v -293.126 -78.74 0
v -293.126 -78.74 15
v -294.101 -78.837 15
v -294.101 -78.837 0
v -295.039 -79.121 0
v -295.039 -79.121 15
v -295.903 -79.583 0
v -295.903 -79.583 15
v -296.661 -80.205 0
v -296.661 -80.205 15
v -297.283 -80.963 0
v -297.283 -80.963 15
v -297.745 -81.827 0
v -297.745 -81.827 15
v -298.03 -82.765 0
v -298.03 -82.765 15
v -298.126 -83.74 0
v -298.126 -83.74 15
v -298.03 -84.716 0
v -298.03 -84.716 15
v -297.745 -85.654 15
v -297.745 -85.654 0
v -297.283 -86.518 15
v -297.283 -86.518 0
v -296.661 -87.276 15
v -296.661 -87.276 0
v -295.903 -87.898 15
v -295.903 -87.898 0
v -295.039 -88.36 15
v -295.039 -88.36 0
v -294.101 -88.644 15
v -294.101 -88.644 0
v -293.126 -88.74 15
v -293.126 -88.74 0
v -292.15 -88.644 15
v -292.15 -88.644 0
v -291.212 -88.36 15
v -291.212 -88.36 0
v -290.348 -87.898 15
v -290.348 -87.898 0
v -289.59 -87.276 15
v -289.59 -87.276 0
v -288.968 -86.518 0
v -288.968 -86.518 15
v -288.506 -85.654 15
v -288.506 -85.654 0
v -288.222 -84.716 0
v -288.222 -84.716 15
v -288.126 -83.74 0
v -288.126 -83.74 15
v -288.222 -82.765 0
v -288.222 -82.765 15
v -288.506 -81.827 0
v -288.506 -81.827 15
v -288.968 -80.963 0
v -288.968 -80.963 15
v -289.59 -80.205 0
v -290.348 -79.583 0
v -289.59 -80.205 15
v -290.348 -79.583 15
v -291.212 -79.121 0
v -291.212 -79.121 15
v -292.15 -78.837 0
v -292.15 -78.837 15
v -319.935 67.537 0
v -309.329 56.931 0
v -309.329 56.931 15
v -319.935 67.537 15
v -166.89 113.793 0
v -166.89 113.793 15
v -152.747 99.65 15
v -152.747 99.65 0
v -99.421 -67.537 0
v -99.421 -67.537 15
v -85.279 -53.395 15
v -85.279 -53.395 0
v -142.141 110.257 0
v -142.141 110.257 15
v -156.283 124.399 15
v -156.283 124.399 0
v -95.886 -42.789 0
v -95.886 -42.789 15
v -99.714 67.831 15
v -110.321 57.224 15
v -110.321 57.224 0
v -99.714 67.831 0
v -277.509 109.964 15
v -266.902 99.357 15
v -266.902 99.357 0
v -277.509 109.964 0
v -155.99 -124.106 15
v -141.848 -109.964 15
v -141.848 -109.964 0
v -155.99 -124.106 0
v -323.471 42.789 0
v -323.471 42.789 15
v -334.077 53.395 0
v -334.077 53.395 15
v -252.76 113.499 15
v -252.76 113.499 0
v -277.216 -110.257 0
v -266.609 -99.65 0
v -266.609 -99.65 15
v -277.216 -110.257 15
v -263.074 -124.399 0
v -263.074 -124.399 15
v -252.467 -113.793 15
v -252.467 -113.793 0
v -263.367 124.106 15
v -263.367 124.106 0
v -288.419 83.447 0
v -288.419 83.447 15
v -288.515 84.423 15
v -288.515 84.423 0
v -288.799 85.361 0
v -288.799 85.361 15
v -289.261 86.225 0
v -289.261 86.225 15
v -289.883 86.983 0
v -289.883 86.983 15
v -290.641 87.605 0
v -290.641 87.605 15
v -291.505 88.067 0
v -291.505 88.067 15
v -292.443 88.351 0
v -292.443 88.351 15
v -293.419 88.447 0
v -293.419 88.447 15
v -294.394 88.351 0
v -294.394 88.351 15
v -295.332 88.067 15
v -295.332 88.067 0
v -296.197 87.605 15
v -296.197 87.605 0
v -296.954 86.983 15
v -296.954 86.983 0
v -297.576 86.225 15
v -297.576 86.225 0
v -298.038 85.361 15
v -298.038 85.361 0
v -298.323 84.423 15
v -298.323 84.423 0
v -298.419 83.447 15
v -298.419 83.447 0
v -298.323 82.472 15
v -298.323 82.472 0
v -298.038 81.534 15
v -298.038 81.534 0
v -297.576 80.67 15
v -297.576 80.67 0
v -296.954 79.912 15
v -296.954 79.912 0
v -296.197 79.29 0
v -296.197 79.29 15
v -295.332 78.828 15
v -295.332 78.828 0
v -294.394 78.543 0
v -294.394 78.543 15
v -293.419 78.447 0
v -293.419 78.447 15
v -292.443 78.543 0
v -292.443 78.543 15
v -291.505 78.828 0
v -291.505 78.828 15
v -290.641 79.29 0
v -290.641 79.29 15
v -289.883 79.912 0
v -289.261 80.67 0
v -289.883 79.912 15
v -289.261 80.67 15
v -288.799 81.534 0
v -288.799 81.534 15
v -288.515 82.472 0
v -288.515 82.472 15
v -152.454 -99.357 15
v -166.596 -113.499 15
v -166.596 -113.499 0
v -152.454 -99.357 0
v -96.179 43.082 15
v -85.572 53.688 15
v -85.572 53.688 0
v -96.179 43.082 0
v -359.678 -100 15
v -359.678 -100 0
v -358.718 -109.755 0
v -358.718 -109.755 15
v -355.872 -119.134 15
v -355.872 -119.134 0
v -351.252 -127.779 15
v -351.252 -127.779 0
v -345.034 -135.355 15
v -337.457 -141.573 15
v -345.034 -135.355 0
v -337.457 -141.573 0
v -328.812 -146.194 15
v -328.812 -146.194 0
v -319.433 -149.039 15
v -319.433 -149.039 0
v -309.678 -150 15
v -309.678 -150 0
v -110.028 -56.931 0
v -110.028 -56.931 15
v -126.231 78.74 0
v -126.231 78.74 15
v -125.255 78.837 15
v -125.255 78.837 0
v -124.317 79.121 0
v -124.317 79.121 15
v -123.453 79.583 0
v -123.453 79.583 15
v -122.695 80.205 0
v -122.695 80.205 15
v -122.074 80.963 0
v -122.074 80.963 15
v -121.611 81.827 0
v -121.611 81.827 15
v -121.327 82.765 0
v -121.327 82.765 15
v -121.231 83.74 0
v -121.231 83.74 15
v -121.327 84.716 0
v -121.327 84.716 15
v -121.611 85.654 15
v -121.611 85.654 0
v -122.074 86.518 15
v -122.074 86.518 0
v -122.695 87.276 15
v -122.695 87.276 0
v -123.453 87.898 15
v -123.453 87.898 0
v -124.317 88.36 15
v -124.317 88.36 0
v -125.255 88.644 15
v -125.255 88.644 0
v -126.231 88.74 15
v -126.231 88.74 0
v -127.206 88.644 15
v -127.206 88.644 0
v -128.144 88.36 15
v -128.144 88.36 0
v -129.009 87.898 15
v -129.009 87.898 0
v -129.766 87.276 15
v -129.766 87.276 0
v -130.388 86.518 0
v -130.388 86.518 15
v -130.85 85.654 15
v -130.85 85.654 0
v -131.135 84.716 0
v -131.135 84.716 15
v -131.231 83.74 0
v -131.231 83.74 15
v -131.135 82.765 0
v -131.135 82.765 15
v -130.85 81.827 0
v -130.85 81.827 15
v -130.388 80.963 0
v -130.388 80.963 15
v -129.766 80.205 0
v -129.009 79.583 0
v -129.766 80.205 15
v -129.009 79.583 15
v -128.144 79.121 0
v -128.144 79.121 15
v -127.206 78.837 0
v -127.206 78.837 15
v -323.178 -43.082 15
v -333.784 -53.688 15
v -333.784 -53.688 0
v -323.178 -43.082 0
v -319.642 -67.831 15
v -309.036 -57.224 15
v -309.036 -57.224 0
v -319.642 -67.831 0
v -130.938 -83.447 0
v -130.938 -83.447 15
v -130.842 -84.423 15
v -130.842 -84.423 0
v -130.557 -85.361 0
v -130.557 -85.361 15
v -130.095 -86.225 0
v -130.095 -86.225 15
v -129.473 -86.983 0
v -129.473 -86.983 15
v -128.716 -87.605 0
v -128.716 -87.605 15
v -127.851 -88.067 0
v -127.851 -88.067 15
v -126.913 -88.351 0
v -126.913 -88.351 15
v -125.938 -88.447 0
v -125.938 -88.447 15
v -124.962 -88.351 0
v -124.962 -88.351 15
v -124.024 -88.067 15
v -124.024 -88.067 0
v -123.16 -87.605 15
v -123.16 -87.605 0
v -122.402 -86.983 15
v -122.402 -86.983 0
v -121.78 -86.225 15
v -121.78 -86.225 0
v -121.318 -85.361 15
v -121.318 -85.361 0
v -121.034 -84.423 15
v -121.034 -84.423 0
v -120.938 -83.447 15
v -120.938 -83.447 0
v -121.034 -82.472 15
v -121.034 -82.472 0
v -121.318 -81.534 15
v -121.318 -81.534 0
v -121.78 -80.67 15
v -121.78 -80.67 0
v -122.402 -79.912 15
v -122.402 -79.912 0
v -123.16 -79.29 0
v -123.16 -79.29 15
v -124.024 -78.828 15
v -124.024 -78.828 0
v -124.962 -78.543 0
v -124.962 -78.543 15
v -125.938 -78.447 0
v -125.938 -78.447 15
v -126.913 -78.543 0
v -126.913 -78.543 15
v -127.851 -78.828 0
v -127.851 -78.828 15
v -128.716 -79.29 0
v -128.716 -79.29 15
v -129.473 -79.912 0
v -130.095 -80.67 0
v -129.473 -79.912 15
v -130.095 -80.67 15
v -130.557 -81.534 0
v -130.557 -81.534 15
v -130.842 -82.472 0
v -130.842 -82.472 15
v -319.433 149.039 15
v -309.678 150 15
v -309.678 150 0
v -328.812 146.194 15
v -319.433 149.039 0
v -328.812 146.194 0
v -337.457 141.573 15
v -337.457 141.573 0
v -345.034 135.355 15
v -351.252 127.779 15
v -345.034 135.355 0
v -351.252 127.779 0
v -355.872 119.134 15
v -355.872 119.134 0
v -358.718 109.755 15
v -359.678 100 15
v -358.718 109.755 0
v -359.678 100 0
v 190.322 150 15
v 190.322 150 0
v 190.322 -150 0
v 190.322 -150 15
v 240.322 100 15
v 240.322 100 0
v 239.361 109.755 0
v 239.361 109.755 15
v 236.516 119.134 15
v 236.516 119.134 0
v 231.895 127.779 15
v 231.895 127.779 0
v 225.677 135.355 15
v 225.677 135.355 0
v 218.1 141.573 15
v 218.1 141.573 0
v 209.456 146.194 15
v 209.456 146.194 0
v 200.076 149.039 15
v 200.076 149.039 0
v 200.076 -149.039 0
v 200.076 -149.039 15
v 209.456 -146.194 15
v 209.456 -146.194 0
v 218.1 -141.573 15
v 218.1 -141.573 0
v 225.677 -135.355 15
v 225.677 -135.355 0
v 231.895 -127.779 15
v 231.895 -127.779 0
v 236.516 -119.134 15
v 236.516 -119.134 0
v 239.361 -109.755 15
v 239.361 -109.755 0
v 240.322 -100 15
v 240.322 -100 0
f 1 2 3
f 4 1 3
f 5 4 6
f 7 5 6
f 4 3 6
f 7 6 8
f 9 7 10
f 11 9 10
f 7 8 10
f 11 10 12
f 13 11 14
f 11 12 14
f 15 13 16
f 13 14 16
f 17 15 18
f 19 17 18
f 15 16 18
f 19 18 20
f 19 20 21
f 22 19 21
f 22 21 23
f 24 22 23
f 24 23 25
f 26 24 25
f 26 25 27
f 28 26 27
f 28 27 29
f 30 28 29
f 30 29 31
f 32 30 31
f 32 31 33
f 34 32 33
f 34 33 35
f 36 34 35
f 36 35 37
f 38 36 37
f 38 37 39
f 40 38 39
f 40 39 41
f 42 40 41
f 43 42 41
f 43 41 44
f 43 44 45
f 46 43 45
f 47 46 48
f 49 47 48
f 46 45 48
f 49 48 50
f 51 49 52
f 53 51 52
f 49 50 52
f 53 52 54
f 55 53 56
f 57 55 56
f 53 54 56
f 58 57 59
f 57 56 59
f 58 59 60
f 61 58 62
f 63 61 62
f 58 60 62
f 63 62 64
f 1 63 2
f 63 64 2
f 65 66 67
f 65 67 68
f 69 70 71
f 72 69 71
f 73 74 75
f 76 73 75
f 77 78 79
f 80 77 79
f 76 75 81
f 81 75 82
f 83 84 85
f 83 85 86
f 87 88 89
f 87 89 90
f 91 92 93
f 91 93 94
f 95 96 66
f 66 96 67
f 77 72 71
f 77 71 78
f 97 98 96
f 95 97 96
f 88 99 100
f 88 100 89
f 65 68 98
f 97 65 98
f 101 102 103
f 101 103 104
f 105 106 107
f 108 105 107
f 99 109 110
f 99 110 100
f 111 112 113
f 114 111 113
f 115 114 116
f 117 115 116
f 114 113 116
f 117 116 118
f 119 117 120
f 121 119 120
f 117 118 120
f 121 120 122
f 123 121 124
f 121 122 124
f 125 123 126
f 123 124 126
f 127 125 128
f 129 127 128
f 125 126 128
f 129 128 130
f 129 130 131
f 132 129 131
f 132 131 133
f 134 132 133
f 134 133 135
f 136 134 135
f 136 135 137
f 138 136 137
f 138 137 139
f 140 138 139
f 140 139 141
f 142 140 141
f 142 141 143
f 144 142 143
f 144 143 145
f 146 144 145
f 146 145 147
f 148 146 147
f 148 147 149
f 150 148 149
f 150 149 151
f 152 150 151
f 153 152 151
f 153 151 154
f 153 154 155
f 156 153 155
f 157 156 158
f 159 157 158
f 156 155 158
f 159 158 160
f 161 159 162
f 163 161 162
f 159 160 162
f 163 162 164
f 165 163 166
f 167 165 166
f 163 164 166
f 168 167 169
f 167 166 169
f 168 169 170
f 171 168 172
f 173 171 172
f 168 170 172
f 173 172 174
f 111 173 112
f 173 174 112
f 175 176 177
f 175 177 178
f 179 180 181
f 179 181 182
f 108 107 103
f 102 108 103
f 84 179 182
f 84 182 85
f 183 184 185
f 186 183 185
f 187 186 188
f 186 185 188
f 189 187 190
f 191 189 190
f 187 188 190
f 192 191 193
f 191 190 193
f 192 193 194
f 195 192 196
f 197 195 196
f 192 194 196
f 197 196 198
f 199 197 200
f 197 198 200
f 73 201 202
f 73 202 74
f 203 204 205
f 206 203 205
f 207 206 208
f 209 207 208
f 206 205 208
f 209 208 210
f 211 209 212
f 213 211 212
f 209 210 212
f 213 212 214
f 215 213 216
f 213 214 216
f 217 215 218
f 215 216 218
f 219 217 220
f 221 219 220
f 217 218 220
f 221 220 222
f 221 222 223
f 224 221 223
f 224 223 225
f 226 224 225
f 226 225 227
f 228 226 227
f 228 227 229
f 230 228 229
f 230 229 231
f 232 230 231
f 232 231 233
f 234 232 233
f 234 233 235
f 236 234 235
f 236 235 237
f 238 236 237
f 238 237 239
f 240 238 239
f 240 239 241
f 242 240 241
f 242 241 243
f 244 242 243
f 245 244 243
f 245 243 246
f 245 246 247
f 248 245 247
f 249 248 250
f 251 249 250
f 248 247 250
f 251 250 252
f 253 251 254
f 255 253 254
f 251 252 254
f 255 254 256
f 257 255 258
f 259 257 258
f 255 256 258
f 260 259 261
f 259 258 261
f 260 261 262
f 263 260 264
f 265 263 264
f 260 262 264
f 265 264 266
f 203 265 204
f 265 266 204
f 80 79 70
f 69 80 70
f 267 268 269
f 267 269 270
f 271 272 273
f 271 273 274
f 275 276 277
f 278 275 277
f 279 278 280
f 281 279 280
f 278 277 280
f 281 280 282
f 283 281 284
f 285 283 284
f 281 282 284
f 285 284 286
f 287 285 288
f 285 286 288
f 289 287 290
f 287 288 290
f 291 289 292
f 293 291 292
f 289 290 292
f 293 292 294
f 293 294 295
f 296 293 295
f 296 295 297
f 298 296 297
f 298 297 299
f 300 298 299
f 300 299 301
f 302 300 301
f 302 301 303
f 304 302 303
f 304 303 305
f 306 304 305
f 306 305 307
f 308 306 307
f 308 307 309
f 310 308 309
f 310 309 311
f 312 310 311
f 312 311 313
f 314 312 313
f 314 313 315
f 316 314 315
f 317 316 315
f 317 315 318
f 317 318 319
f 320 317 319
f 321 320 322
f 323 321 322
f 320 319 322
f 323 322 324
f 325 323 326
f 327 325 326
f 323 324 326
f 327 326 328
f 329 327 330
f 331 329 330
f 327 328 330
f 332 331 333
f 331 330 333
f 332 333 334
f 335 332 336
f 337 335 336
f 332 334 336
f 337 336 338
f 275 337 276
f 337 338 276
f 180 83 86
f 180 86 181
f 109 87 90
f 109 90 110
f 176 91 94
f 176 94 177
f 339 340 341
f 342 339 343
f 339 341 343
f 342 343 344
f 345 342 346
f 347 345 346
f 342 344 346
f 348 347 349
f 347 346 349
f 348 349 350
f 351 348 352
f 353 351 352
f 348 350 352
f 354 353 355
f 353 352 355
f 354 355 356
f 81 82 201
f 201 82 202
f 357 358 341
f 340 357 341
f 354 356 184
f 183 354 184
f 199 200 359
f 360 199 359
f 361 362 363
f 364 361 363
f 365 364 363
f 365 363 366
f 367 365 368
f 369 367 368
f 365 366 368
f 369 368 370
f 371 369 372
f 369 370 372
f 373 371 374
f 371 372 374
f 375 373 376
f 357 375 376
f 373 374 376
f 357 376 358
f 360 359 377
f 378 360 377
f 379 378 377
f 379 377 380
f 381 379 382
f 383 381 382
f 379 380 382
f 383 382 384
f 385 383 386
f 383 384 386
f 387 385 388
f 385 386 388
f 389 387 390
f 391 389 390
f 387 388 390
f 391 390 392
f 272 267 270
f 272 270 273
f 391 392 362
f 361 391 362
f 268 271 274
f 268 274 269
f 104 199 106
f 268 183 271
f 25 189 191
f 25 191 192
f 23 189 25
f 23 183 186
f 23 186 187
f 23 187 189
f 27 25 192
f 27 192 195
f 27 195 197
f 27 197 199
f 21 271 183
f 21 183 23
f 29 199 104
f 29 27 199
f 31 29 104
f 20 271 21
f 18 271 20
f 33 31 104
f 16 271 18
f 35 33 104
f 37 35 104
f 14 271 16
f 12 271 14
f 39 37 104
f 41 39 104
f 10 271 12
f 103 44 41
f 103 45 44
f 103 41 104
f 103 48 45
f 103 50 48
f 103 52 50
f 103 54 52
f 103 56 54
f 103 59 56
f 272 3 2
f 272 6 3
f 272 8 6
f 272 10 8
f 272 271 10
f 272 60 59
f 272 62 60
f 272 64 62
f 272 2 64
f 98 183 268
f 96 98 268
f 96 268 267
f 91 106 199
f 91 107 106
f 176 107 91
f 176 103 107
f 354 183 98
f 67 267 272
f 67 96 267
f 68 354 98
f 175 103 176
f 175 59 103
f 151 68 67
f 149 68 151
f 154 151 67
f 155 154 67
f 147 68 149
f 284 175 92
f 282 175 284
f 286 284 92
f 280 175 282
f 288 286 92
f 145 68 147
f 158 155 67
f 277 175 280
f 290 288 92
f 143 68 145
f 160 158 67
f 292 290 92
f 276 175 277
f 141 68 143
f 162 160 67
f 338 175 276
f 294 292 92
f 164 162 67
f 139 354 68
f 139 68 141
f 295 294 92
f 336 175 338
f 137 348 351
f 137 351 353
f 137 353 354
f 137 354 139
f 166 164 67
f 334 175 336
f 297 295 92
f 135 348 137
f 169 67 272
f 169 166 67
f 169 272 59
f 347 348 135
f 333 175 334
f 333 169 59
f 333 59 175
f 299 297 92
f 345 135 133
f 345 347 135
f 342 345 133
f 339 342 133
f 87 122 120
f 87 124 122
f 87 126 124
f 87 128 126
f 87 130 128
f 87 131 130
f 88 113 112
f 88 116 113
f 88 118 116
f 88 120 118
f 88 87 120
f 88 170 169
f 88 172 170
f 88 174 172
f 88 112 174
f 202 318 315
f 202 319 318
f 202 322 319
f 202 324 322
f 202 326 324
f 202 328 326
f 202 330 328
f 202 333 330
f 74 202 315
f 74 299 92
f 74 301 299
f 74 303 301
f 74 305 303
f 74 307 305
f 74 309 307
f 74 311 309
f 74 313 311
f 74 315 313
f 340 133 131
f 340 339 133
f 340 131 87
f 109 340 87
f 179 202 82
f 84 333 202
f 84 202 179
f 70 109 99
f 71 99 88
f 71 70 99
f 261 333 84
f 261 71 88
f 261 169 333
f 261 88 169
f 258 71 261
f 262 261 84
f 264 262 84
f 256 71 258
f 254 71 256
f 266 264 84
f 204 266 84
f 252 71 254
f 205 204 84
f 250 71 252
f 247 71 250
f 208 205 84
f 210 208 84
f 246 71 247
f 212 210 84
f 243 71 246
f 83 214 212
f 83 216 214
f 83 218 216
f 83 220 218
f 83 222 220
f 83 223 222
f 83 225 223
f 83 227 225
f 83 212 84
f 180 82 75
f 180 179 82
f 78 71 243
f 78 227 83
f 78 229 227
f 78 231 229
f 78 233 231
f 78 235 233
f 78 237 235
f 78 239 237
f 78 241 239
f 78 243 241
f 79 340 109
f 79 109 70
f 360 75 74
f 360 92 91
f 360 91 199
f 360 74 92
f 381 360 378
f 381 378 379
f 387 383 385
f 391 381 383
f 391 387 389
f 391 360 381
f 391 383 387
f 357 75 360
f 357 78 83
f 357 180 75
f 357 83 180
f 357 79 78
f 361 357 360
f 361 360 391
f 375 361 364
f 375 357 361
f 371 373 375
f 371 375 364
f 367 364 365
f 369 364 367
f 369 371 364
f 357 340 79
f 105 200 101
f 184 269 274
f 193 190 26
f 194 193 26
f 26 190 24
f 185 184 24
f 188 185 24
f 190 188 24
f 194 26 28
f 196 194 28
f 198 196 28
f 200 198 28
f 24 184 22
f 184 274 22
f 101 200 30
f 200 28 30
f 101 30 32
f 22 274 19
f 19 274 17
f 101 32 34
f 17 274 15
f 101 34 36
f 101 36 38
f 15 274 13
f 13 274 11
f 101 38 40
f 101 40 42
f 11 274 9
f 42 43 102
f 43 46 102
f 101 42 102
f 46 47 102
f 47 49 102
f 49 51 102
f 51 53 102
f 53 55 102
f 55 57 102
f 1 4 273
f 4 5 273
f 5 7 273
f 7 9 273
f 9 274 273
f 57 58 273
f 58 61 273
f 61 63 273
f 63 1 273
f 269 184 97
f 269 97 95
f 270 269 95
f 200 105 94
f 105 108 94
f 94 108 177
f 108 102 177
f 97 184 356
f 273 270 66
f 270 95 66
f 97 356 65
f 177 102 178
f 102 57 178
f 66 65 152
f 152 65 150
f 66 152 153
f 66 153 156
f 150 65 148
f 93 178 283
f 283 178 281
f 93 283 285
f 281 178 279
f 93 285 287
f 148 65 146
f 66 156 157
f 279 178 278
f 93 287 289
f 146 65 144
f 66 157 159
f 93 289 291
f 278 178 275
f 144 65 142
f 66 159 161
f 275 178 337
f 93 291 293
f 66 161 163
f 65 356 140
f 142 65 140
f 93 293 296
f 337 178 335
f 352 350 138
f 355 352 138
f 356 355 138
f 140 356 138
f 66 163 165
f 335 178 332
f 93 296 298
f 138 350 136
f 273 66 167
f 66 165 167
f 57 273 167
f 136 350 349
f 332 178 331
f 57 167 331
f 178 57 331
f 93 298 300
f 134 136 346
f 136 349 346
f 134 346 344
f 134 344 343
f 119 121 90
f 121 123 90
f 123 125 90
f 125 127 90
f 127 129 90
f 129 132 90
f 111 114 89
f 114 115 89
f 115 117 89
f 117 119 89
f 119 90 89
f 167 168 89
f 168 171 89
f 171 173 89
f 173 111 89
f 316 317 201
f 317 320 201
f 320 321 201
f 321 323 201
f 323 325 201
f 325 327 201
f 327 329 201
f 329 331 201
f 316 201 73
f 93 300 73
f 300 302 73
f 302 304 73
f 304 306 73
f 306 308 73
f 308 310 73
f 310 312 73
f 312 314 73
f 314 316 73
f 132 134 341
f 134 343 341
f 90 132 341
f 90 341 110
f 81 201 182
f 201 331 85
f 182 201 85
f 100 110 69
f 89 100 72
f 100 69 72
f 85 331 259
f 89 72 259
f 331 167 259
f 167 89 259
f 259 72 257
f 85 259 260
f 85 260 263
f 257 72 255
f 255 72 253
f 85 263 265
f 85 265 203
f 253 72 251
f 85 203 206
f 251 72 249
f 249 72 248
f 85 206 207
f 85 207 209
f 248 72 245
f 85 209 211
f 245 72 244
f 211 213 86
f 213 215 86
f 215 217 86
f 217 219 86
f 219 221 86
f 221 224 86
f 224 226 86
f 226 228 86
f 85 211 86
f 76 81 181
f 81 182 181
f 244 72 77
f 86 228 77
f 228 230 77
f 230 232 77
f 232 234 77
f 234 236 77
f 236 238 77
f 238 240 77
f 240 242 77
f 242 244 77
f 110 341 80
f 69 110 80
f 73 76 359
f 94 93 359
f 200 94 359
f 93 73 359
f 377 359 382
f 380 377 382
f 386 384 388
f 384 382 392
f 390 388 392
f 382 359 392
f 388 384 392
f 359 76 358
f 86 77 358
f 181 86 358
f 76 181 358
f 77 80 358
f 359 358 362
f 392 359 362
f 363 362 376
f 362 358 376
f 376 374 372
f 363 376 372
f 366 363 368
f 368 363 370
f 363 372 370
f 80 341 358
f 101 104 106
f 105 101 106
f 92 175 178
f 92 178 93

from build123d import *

# Parameters (mm, degrees)
BOSS_EXTRU_1_DEPTH           = 15
ESQUISSE3_R                  = 5
ENL_V_MAT_EXTRU_1_DEPTH      = 390.991583511
R_P_TITION_CIRCULAIRE1_COUNT = 4


with BuildPart() as part:
    # Esquisse1 → Boss.-Extru.1 (new body)
    with BuildSketch(Plane.XY):
        with BuildLine():
            ThreePointArc((-359.678238443, -100), (-345.033577502, -135.355339059), (-309.678238443, -150))
            Line((-309.678238443, -150), (190.321761557, -150))
            ThreePointArc((190.321761557, -150), (225.677100616, -135.355339059), (240.321761557, -100))
            Line((240.321761557, -100), (240.321761557, 100))
            ThreePointArc((240.321761557, 100), (225.677100616, 135.355339059), (190.321761557, 150))
            Line((190.321761557, 150), (-309.678238443, 150))
            ThreePointArc((-309.678238443, 150), (-345.033577502, 135.355339059), (-359.678238443, 100))
            Line((-359.678238443, 100), (-359.678238443, -100))
        make_face()
    extrude(amount=BOSS_EXTRU_1_DEPTH)

    # Esquisse3 → Enlèv. mat.-Extru.1 (cut, through all)
    with BuildSketch(Plane.XY.offset(15)):
        with Locations((-293.418714055, 83.447366527)):
            Circle(ESQUISSE3_R)
        Polygon((-263.366675854, 124.106006445), (-252.760074137, 113.499404727), (-266.90220976, 99.357269104), (-277.508811478, 109.963870821), align=None)
        Polygon((-309.328616632, 56.930862233), (-319.935218349, 67.53746395), (-334.077353973, 53.395328327), (-323.470752255, 42.788726609), align=None)
    enl_v_mat_extru_1 = extrude(amount=-ENL_V_MAT_EXTRU_1_DEPTH, mode=Mode.SUBTRACT)

    # Répétition circulaire1: Enlèv. mat.-Extru.1 ×4 about axis
    r_p_tition_circulaire1_axis = Axis((-209.678238443, 0, 15), (0, 0, -1))
    for i in range(1, R_P_TITION_CIRCULAIRE1_COUNT):
        add(enl_v_mat_extru_1.rotate(r_p_tition_circulaire1_axis, i * 360 / R_P_TITION_CIRCULAIRE1_COUNT), mode=Mode.SUBTRACT)


solid = part.part
